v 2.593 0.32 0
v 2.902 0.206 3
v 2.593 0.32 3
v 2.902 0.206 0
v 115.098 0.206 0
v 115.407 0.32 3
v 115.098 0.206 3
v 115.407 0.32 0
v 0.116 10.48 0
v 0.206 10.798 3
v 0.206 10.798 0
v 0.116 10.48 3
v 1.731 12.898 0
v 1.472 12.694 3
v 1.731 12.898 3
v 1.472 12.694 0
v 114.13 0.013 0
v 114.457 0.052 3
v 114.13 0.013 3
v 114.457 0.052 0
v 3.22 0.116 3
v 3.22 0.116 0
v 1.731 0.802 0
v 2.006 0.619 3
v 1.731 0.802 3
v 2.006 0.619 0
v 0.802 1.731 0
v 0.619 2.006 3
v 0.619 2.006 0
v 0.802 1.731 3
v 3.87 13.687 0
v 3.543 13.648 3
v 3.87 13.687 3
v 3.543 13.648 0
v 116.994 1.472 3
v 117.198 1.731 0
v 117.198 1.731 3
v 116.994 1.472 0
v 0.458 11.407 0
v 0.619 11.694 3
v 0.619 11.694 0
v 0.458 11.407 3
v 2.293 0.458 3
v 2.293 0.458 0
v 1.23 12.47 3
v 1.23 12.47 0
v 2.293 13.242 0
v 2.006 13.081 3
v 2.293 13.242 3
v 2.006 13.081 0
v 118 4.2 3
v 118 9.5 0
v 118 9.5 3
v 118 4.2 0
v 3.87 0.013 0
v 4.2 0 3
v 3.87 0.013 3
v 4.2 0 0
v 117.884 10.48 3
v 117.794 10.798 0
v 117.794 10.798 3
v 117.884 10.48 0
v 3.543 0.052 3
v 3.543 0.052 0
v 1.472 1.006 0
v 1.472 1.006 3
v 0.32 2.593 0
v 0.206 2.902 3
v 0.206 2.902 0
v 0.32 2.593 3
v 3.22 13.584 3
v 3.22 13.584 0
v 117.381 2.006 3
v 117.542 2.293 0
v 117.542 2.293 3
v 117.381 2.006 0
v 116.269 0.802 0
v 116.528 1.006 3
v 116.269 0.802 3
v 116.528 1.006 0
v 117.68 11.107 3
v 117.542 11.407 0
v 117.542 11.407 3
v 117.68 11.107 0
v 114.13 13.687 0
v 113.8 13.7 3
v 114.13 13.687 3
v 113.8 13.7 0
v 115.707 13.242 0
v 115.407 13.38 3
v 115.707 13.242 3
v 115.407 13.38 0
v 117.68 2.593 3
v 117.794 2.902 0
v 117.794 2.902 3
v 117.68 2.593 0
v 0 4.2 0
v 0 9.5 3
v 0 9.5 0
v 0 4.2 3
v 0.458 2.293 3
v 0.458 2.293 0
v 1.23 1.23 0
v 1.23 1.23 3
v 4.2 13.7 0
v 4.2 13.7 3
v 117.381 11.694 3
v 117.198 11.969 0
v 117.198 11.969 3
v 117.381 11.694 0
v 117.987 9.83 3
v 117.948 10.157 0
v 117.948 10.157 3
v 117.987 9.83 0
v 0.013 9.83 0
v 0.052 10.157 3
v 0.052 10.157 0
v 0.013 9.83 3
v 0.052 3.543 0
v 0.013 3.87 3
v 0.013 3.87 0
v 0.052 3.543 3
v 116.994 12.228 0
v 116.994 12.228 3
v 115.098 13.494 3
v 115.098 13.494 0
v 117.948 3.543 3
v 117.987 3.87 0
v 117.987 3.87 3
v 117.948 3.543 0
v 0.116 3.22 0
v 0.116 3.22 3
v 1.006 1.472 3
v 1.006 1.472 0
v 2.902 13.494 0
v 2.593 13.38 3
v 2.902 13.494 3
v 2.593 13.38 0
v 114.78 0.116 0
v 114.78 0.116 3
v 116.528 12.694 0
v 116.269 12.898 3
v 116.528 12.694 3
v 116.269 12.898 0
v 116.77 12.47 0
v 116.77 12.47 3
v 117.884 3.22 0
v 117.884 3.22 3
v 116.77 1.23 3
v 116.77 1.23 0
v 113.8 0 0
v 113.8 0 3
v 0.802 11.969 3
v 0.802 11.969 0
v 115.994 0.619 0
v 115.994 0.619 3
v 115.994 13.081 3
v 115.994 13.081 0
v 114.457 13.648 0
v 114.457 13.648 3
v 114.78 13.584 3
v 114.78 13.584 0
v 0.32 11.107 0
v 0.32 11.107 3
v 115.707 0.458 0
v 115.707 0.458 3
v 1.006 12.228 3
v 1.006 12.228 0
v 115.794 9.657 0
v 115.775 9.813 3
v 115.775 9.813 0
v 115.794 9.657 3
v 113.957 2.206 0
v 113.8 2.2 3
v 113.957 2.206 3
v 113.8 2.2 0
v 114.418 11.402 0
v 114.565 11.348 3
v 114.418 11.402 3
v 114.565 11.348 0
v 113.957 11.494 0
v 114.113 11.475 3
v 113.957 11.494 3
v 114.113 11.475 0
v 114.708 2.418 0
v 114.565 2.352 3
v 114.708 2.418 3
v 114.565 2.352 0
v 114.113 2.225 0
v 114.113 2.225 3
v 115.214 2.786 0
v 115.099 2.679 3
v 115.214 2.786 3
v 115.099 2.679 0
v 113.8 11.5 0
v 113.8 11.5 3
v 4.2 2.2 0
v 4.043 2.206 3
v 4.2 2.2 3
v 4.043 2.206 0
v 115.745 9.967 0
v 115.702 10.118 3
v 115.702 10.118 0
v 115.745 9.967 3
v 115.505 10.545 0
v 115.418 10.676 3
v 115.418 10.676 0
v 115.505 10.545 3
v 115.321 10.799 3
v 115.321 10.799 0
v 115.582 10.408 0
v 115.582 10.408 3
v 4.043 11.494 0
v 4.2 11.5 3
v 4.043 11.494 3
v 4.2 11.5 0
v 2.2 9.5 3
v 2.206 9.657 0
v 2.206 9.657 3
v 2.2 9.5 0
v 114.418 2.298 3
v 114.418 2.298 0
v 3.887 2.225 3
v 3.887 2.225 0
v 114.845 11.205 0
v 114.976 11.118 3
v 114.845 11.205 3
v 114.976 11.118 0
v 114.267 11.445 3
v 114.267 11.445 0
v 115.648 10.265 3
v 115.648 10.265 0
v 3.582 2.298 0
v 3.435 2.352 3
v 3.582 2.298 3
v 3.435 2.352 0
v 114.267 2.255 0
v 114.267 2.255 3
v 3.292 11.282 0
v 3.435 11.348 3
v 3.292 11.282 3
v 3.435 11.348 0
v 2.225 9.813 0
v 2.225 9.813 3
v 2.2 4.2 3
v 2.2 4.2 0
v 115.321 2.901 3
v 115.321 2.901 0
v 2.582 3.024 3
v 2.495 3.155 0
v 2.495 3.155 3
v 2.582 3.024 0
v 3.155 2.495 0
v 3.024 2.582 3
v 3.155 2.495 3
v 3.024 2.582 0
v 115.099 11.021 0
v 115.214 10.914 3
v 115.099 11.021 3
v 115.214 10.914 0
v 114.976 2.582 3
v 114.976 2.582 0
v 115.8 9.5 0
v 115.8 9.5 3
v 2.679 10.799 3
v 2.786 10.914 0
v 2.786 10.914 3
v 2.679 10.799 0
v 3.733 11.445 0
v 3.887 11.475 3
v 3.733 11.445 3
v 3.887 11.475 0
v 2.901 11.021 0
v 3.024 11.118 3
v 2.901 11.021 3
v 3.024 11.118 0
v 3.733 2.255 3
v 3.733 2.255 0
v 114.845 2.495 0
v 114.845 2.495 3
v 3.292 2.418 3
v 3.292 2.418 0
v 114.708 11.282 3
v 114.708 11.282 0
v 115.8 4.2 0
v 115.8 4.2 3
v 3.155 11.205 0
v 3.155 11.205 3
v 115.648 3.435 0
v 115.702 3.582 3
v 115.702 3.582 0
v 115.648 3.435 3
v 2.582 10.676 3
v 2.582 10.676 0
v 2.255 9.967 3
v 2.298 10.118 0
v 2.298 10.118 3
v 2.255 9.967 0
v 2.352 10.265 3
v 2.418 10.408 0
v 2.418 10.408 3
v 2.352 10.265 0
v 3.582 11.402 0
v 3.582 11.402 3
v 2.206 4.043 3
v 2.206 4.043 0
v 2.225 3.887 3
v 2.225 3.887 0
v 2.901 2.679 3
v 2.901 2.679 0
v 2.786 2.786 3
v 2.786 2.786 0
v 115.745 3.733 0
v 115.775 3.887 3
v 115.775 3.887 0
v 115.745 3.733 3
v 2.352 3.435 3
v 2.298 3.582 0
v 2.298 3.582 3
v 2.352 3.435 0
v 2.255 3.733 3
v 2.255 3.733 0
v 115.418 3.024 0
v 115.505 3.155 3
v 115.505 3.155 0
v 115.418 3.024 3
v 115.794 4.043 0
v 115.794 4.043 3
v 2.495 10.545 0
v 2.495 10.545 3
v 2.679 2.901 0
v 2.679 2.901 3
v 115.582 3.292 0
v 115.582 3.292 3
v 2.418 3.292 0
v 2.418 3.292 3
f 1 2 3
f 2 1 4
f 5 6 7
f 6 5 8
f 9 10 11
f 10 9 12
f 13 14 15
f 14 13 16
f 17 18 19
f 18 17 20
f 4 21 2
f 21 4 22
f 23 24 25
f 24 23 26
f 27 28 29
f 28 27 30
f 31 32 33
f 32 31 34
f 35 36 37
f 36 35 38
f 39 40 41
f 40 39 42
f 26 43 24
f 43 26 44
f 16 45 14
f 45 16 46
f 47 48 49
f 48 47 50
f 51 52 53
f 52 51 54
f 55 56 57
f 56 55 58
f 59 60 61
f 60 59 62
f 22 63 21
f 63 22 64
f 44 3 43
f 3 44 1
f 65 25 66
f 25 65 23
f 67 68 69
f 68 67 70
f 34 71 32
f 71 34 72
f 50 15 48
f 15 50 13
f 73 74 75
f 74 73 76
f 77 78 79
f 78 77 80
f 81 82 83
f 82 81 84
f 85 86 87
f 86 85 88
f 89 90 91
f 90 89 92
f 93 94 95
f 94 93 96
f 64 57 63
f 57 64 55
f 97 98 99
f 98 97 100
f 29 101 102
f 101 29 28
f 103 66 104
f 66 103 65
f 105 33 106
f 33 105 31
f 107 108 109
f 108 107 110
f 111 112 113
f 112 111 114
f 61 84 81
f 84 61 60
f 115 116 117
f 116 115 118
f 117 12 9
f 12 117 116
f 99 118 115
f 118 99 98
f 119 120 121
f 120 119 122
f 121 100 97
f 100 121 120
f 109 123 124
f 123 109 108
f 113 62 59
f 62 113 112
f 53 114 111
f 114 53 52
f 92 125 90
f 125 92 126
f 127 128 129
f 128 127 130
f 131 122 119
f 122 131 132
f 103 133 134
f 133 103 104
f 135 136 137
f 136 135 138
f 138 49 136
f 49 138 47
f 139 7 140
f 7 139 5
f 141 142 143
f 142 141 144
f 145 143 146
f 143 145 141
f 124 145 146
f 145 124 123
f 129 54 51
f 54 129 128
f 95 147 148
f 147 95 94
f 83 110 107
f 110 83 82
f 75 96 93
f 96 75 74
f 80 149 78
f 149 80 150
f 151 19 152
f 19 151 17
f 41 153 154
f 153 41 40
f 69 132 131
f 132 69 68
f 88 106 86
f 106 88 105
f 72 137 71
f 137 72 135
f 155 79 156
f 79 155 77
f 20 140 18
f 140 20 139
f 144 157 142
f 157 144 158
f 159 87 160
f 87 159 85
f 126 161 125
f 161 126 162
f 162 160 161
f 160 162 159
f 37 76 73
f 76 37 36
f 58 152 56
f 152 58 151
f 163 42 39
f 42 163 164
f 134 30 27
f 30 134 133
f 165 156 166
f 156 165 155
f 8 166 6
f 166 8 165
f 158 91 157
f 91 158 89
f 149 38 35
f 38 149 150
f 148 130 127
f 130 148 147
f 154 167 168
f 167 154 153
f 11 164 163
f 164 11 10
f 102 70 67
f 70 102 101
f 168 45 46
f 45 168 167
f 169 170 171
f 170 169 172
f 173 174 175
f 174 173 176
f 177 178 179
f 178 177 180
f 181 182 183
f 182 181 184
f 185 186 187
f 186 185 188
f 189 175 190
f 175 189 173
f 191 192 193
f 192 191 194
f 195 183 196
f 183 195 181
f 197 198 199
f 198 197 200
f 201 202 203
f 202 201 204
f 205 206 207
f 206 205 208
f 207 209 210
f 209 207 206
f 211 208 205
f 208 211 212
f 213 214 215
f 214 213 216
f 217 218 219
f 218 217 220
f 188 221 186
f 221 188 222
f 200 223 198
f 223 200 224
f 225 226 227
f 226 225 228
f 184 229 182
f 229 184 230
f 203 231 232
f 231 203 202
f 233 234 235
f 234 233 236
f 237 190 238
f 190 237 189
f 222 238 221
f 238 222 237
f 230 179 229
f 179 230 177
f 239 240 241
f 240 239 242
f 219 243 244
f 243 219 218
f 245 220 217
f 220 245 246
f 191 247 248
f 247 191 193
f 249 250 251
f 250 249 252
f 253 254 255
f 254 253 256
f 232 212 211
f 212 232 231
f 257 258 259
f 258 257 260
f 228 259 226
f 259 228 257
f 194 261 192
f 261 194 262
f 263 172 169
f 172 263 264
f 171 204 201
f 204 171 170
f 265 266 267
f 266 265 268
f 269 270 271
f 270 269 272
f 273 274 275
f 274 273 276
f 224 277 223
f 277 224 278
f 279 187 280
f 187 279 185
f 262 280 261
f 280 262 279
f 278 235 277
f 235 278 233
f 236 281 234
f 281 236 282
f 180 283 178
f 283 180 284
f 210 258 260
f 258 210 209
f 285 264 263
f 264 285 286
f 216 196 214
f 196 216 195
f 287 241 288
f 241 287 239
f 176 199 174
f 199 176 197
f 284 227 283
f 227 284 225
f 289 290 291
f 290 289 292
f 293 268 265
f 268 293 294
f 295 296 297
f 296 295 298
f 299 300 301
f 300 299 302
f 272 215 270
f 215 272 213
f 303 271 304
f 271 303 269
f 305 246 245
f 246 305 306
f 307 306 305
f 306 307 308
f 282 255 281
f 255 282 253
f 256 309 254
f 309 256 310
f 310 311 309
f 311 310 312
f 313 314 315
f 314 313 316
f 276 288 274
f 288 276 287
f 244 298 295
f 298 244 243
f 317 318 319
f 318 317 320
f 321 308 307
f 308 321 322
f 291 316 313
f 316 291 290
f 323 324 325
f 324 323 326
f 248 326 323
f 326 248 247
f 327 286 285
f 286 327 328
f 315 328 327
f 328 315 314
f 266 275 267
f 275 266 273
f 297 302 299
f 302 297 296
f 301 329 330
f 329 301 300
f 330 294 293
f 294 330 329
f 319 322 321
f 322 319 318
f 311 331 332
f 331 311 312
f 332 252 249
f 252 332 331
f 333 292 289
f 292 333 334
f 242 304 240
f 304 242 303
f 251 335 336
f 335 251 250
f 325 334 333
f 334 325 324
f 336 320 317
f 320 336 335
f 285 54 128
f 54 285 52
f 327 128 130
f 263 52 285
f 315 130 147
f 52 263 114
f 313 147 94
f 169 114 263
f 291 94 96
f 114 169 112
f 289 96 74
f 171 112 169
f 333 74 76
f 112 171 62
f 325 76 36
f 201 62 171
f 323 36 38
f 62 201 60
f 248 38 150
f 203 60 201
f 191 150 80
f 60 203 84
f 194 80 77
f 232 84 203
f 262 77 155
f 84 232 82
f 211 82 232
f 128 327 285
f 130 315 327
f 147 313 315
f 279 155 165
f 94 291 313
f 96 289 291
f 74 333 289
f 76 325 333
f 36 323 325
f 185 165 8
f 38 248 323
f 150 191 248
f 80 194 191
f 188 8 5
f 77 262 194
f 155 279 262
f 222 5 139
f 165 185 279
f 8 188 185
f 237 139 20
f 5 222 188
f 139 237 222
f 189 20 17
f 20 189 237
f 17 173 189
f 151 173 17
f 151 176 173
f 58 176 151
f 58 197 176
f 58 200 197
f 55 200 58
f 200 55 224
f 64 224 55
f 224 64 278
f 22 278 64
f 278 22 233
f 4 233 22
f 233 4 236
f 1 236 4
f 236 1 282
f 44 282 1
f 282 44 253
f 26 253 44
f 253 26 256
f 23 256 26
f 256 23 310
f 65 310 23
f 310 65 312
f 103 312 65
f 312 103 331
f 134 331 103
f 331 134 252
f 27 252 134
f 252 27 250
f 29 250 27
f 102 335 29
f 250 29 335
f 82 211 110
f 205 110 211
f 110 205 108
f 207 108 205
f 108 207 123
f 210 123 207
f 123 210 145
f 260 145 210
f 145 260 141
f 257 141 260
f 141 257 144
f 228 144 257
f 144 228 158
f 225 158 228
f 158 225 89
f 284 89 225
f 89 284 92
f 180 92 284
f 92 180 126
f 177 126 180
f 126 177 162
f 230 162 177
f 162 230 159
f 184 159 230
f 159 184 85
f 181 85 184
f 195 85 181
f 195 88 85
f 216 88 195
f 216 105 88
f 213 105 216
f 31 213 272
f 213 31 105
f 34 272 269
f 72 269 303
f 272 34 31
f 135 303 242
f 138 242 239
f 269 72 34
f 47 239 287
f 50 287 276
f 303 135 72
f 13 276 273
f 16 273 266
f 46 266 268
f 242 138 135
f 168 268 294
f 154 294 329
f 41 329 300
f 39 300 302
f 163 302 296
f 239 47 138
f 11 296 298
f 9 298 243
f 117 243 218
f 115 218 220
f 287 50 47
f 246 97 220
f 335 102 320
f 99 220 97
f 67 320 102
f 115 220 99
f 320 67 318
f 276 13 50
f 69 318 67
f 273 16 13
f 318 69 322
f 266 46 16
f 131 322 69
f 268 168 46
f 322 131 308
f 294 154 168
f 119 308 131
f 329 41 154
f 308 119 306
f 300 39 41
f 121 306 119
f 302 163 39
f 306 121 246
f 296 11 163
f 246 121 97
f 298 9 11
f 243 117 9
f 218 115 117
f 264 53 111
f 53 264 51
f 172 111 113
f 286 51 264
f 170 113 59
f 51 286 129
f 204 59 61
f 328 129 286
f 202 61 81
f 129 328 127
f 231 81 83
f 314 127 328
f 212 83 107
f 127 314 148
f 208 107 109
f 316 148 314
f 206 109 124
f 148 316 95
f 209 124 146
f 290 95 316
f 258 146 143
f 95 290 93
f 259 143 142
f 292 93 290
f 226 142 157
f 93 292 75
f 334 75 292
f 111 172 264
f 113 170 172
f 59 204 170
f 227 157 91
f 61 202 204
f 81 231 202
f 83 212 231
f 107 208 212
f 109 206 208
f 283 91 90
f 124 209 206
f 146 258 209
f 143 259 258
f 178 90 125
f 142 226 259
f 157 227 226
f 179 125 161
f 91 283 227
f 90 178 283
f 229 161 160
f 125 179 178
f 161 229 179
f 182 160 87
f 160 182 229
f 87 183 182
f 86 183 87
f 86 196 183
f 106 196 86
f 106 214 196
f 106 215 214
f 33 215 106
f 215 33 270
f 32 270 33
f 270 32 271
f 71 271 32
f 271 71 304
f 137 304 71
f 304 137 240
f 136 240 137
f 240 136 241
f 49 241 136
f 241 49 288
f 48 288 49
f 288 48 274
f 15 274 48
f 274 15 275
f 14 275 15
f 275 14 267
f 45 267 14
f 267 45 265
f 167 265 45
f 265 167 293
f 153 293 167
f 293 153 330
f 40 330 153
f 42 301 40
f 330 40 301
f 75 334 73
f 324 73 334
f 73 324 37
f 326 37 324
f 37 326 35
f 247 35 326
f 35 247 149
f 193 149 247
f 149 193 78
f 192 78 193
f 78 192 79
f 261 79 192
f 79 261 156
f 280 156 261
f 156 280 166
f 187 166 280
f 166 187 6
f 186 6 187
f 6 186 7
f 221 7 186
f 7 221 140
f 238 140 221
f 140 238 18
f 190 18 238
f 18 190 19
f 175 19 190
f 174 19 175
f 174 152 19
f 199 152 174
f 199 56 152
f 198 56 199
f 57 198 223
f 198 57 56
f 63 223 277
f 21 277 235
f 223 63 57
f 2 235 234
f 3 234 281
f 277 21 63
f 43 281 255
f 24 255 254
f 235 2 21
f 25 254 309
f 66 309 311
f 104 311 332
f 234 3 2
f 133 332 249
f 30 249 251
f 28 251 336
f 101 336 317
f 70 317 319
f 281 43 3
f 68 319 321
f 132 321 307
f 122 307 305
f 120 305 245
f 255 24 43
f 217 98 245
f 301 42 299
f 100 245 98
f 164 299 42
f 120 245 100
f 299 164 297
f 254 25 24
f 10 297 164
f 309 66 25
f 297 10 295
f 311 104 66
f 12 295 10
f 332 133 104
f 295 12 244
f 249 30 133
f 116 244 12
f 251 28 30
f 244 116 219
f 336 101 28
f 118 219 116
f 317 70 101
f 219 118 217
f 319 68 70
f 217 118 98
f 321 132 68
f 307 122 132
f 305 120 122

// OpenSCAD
// file: kindle_shell.scad
// ====================================================
// Kindle 10th Gen Basic (J9G29R) Sleeve Generator
// True Half-Circle Thumb Scoops (Depth = Radius)
// Dimensions: 160 x 113 x 8.7 mm
//
// kindle_shell()  - the full case (default render)
// test_ring()     - a slice cut from the middle of the very same case,
//                   so the ring always matches the case exactly
// ====================================================

$fn = 80; // High resolution for smooth curves

// Kindle Exact Dimensions
k_height = 160.0;
k_width  = 113.0;
k_thick  = 8.7;
k_radius = 8.5; // Corner radius of Kindle body

// Tolerances & Shell Properties
clearance   = 0.6; // Inner clearance (+0.6mm total for smooth glide)
wall_thick  = 2.2; // Rigid outer wall thickness

// True Half-Circle Cutout Geometry (Depth equals Radius)
scoop_radius = 15.0; // Radius of the semi-circle
scoop_depth  = 0.0; // 0 = circle centered on the top edge, i.e. a true half-circle

// Edge rounding of the faces (inner cavity; outer adds wall_thick for even walls)
edge_radius = 2.0; // must be <= k_radius and < in_t / 2

// Test ring
ring_height = 3.0;  // Slice thickness (min sensible ~3mm: 2.2mm wall, 15 layers at 0.2)
ring_y      = 70.0; // Where along the case height to cut (clear of bottom wall and scoops)

// Calculated Inner Cavity Dimensions
in_w = k_width + clearance;
in_h = k_height + clearance;
in_t = k_thick + clearance;

// Outer Shell Dimensions
out_w = in_w + (wall_thick * 2);
out_h = in_h + wall_thick;
out_t = in_t + (wall_thick * 2);

// Box with plan-view corner radius r and rounded face edges (radius e, e <= r, e <= t/2)
module rounded_cube(w, h, t, r, e) {
    module corner() {
        rotate_extrude()
            hull() {
                square([0.01, t]);
                translate([r - e, e]) circle(r=e);
                translate([r - e, t - e]) circle(r=e);
            }
    }
    hull() {
        translate([r, r, 0]) corner();
        translate([w - r, r, 0]) corner();
        translate([r, h - r, 0]) corner();
        translate([w - r, h - r, 0]) corner();
    }
}

module kindle_shell() {
    difference() {
        // 1. Main Outer Shell
        rounded_cube(out_w, out_h, out_t, k_radius + wall_thick, edge_radius + wall_thick);

        // 2. Hollow Inner Cavity for Kindle
        translate([wall_thick, wall_thick, wall_thick])
            rounded_cube(in_w, in_h + 10, in_t, k_radius, edge_radius);

        // 3. Front True Half-Circle Scoop
        translate([out_w / 2, out_h - scoop_depth, out_t + 1])
            cylinder(r=scoop_radius, h=wall_thick * 4, center=true);

        // 4. Back True Half-Circle Scoop (Symmetrical)
        translate([out_w / 2, out_h - scoop_depth, -1])
            cylinder(r=scoop_radius, h=wall_thick * 4, center=true);
    }
}

module test_ring() {
    // Slice the case across its height, then lay the slice flat for printing
    translate([0, 0, ring_height])
        rotate([-90, 0, 0])
            translate([0, -ring_y, 0])
                intersection() {
                    kindle_shell();
                    translate([-1, ring_y, -1])
                        cube([out_w + 2, ring_height, out_t + 2]);
                }
}

kindle_shell();
// main file
// Fit-test ring: a slice of the real case (see kindle_shell.scad).
// `use` imports only the modules, so the full case is not rendered here.
use <kindle_shell.scad>

test_ring();
